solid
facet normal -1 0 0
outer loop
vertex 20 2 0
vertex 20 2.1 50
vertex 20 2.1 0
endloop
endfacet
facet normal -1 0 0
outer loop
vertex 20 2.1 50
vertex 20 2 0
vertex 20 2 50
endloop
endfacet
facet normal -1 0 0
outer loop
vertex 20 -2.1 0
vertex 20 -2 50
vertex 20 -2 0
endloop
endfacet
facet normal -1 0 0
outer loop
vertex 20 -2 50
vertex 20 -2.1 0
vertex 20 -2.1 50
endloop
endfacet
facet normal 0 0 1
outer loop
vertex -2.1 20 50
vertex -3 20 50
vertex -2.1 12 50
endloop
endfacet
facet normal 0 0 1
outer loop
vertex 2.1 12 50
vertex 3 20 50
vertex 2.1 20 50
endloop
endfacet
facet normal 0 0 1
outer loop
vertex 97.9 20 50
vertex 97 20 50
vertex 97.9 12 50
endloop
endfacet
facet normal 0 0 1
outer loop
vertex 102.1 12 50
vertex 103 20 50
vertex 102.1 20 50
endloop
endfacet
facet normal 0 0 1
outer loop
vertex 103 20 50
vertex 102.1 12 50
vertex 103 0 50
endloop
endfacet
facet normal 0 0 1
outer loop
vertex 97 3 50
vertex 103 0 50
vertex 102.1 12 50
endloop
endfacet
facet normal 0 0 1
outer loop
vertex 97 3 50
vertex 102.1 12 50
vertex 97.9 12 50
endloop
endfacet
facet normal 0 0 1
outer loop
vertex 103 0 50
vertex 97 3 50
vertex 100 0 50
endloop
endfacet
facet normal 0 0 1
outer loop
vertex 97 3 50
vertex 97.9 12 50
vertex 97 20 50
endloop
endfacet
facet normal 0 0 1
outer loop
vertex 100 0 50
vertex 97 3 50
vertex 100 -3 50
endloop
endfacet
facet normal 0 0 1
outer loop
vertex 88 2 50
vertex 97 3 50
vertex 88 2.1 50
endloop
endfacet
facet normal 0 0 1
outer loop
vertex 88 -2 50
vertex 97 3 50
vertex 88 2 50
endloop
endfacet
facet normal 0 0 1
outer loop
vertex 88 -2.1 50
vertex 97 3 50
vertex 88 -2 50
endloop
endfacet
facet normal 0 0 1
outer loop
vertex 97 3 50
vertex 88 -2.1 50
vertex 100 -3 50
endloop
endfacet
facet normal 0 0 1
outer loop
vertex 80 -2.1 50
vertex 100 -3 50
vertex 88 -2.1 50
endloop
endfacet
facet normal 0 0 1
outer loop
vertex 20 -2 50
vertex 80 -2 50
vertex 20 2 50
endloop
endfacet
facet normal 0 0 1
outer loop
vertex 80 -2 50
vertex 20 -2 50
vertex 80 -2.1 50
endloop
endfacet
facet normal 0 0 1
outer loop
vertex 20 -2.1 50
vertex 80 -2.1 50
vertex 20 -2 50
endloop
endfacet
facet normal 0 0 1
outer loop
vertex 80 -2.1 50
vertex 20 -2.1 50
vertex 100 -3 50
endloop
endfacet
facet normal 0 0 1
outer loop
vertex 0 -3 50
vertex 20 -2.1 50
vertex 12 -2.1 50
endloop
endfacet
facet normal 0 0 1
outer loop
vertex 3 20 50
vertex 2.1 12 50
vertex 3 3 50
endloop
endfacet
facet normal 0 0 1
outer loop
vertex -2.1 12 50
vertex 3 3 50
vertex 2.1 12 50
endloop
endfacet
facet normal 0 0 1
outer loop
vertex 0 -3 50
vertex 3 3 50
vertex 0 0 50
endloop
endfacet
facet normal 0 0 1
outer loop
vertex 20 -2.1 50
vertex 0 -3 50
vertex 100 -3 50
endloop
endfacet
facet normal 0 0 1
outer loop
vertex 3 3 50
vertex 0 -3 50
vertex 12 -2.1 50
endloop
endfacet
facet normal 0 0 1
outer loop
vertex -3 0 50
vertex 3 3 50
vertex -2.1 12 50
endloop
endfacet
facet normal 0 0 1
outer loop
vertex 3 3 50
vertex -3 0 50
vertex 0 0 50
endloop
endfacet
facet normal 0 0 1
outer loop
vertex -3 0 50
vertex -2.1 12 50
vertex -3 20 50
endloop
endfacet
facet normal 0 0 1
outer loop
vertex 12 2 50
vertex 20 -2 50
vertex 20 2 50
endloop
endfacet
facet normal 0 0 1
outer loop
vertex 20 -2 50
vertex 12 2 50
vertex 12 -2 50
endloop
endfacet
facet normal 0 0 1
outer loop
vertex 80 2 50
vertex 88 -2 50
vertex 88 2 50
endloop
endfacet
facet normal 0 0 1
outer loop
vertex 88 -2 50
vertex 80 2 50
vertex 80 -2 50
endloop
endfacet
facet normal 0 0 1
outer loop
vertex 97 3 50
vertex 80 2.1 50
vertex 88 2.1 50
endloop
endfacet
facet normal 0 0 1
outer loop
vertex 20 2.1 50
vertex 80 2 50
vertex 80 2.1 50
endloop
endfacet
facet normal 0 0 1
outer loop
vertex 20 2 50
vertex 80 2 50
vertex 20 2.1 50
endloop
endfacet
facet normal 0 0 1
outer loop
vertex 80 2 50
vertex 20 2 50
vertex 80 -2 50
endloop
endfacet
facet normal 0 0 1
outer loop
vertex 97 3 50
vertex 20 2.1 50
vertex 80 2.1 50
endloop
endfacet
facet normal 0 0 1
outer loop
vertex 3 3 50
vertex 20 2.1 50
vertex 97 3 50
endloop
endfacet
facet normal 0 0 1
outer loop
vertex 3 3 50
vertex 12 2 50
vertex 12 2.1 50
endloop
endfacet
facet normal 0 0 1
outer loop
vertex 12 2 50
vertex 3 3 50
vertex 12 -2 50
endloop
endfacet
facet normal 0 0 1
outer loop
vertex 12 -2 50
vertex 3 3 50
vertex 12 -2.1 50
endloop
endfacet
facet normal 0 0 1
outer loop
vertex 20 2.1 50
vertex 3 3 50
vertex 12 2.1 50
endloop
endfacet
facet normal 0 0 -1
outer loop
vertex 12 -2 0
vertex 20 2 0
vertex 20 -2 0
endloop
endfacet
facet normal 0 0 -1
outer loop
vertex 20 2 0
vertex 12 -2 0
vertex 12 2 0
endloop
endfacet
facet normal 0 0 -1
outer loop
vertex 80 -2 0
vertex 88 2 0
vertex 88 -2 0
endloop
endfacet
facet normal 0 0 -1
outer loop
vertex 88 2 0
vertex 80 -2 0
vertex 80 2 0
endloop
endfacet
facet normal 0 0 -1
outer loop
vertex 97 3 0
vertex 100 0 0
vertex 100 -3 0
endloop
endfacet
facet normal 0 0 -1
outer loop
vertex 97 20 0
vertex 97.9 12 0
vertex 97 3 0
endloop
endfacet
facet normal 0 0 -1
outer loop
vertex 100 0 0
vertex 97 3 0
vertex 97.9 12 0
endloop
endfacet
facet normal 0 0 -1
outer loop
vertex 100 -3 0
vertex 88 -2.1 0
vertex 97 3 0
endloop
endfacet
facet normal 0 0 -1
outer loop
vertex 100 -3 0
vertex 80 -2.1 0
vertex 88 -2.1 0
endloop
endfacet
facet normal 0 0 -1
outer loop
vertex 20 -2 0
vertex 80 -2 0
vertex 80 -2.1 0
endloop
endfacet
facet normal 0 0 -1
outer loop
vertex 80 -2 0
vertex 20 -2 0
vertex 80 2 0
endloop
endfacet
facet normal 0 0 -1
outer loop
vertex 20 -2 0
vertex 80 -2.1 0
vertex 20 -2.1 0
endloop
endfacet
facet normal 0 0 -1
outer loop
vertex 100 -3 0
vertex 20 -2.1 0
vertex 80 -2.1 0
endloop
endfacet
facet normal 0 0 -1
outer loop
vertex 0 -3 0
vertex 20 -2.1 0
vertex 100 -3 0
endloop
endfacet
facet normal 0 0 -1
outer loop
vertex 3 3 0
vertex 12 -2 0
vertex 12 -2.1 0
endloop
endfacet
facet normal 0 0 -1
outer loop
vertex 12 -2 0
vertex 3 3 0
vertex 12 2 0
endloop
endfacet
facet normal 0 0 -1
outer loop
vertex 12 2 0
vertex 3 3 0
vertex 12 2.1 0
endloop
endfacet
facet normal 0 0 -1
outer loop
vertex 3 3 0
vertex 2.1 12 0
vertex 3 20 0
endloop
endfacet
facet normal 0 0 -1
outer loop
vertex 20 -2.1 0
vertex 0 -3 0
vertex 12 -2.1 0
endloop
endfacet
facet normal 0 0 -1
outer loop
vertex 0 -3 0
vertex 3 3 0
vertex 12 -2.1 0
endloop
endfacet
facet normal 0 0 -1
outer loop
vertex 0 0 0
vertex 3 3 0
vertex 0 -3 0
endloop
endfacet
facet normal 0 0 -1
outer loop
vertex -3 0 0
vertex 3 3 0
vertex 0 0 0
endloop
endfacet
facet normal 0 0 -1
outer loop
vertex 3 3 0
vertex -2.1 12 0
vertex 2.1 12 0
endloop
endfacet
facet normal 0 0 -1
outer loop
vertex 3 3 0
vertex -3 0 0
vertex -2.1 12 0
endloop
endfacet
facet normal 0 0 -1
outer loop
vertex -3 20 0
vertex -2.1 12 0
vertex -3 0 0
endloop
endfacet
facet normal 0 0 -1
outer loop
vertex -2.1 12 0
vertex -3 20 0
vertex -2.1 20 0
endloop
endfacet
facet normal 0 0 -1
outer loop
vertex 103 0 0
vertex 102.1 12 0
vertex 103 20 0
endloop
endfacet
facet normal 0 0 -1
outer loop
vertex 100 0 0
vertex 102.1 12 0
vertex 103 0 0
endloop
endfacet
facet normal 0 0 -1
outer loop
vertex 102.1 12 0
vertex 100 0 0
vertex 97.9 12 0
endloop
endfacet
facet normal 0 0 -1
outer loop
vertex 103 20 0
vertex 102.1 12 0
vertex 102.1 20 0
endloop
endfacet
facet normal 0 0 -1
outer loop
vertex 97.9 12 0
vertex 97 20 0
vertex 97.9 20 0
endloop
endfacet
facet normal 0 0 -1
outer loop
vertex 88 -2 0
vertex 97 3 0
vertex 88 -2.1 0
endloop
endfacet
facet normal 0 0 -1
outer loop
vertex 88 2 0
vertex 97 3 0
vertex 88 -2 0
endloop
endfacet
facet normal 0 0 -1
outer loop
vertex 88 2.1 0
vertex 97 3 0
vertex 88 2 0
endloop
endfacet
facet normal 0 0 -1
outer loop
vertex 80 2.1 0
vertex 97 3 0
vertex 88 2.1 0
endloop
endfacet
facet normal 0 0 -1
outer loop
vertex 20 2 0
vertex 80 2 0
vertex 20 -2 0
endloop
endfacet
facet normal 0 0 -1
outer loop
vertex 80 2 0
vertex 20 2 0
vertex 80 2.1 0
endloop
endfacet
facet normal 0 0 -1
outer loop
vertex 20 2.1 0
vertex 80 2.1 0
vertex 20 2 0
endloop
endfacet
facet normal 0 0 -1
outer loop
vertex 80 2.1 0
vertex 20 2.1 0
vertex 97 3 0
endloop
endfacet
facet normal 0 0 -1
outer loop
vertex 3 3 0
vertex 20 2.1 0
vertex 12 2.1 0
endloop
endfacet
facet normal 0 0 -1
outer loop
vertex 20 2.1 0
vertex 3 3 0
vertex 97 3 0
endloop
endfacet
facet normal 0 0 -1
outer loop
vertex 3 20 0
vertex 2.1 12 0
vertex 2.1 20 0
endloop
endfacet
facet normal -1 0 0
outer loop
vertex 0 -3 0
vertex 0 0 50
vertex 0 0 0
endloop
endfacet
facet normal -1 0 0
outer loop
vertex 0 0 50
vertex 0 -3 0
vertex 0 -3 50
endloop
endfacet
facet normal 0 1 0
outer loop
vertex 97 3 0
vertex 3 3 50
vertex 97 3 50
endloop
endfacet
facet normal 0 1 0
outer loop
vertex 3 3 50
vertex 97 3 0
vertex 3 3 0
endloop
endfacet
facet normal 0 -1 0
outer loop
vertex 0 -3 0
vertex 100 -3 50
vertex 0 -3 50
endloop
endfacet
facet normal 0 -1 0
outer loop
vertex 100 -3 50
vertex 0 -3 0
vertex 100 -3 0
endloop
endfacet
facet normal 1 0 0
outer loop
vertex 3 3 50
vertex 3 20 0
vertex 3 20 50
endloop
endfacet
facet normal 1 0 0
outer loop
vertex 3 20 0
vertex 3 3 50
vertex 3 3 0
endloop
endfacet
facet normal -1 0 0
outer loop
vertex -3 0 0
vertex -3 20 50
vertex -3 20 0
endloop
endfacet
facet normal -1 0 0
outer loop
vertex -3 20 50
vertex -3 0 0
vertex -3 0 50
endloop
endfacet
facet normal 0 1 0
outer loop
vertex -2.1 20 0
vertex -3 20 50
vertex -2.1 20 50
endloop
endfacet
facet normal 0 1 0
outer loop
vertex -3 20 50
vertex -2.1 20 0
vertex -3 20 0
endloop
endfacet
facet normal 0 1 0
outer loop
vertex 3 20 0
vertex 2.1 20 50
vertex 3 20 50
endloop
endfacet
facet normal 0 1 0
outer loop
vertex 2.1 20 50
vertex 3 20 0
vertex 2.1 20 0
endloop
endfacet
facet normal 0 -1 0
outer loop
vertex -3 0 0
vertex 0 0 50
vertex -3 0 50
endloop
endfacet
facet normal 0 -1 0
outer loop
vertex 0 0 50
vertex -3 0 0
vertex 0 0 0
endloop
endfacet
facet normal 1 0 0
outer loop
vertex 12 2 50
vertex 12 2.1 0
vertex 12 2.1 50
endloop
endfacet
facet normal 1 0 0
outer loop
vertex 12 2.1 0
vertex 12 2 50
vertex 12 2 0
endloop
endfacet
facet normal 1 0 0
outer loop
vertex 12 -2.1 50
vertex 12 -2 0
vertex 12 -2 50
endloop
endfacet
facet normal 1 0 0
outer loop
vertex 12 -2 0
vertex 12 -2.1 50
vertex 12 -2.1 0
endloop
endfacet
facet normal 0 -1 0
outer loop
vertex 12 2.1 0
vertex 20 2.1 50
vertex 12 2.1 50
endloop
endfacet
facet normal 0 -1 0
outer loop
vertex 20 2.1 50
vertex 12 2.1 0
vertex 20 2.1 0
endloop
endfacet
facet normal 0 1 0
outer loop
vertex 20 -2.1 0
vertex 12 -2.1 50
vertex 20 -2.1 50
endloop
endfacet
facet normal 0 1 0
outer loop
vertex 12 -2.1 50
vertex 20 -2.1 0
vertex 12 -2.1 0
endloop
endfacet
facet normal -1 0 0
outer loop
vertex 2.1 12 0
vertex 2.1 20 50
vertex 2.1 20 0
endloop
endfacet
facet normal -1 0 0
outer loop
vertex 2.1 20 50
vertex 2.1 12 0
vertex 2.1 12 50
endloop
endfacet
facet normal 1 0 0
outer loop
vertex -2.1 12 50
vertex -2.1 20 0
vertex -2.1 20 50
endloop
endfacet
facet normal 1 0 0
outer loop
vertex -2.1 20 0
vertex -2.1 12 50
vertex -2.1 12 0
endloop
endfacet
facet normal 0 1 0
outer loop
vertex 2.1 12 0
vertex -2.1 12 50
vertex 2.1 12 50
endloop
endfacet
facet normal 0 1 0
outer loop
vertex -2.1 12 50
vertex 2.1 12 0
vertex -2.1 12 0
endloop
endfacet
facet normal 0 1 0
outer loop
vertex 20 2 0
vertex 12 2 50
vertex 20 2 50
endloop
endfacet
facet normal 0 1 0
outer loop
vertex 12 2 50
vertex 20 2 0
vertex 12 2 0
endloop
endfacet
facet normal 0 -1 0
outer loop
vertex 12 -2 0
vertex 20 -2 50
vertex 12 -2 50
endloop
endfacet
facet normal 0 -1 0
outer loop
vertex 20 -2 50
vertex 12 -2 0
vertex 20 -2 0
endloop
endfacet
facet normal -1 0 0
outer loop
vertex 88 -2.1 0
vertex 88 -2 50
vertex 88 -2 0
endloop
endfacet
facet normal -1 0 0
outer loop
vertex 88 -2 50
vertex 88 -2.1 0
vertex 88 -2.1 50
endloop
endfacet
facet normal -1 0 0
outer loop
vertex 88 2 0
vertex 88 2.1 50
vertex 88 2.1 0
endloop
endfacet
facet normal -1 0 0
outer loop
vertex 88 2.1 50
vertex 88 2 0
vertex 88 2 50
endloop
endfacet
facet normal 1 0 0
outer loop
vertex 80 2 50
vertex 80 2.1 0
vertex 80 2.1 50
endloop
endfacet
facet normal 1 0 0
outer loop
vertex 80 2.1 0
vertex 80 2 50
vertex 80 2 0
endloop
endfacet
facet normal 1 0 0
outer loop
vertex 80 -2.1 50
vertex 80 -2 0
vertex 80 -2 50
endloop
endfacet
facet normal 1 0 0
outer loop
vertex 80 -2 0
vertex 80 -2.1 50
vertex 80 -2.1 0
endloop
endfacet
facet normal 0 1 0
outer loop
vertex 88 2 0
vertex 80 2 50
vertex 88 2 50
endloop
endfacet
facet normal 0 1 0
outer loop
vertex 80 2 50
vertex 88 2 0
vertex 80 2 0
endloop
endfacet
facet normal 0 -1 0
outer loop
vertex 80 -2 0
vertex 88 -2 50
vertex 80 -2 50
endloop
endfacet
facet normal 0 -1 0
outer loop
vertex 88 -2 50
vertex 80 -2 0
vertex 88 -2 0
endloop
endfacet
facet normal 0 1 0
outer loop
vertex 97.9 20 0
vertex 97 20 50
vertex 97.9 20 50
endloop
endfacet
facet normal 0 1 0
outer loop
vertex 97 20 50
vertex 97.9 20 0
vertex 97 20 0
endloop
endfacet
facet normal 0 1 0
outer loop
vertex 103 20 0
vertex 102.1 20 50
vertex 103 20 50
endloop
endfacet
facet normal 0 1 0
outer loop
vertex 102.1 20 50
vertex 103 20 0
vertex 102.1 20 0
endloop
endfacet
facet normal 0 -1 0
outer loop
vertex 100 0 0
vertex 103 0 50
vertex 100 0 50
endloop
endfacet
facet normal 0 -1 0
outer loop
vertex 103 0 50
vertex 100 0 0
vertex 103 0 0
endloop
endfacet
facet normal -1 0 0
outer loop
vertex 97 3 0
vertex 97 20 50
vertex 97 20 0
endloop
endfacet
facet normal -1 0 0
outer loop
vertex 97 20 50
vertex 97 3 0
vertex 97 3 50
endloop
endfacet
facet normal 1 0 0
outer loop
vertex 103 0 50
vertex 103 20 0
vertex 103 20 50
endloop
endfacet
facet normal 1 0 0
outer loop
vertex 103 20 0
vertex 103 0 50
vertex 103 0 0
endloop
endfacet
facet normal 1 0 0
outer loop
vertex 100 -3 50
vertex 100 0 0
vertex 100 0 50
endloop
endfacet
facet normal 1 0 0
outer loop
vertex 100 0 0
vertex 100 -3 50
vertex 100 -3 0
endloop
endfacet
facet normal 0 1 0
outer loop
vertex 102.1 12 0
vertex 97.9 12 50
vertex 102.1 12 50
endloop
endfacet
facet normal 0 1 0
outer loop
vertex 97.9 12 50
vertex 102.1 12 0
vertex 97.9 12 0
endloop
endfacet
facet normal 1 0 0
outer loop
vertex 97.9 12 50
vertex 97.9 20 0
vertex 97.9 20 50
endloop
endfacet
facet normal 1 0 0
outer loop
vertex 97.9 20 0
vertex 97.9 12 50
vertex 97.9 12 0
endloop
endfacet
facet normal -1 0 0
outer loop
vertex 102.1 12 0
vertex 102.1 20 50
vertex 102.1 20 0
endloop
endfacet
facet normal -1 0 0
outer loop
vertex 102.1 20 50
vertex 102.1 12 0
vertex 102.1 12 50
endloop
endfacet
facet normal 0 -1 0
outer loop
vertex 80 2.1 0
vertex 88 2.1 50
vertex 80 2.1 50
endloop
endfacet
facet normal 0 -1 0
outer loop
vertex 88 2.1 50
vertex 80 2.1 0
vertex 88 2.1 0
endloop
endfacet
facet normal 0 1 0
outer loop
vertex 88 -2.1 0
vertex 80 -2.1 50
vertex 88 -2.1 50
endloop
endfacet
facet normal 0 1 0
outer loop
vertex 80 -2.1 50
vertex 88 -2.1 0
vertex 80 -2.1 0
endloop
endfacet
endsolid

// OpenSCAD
// SaySpark Maze — Wall + Corner system (parametric, FDM-friendly)
// Walls have tabs on both ends; corners have sockets on both arms.
// Plug a wall's tab into a corner's socket. F5 to preview, F6 to render.
// File > Export > Export as STL when ready to print.

/* [Cell + scale (mm)] */
cell_size      = 100;  // [50:5:200]   distance between adjacent corner centres
wall_height    = 50;   // [20:1:100]
wall_thickness = 6;    // [3:0.5:15]

/* [Joint geometry] */
arm_length     = 20;   // [10:1:30]    length of each corner arm
tab_length     = 8;    // [4:1:15]     how far the tab plunges into the socket
tab_width      = 4;    // [2:0.5:8]    tab width (must be < wall_thickness)
slot_clearance = 0.2;  // [0.1:0.05:0.4]  printer tolerance gap

/* [What to render] */
part = "demo";  // [wall, corner, demo]

$fn = 48;

// ─── Derived ────────────────────────────────────────────────────────────
wall_body_length = cell_size - 2*arm_length;

// ─── Wall — tabs on both ends ───────────────────────────────────────────
module wall_segment() {
  // Body, centered along X
  translate([-wall_body_length/2, -wall_thickness/2, 0])
    cube([wall_body_length, wall_thickness, wall_height]);
  // Tab on each end
  for (sx = [-1, 1])
    translate([sx * (wall_body_length/2 + (sx > 0 ? 0 : tab_length)),
               -tab_width/2, 0])
      cube([tab_length, tab_width, wall_height]);
}

// ─── Corner — L-shape with sockets on each arm end ──────────────────────
module corner_piece() {
  difference() {
    union() {
      // Arm going +X
      translate([0, -wall_thickness/2, 0])
        cube([arm_length, wall_thickness, wall_height]);
      // Arm going +Y
      translate([-wall_thickness/2, 0, 0])
        cube([wall_thickness, arm_length, wall_height]);
    }
    // Socket at end of +X arm
    translate([arm_length - tab_length,
               -(tab_width + slot_clearance)/2, -0.01])
      cube([tab_length + 0.02,
            tab_width + slot_clearance,
            wall_height + 0.02]);
    // Socket at end of +Y arm
    translate([-(tab_width + slot_clearance)/2,
               arm_length - tab_length, -0.01])
      cube([tab_width + slot_clearance,
            tab_length + 0.02,
            wall_height + 0.02]);
  }
}

// ─── Demo: corner — wall — corner, forming a U turn ────────────────────
module demo() {
  // Left corner at origin, arms +X and +Y
  corner_piece();
  // Wall spanning between
  translate([cell_size/2, 0, 0])
    wall_segment();
  // Right corner, rotated 90° so its arms are -X and +Y
  translate([cell_size, 0, 0])
    rotate([0, 0, 90])
      corner_piece();
}

// ─── Render ─────────────────────────────────────────────────────────────
if      (part == "wall")   wall_segment();
else if (part == "corner") corner_piece();
else if (part == "demo")   demo();
